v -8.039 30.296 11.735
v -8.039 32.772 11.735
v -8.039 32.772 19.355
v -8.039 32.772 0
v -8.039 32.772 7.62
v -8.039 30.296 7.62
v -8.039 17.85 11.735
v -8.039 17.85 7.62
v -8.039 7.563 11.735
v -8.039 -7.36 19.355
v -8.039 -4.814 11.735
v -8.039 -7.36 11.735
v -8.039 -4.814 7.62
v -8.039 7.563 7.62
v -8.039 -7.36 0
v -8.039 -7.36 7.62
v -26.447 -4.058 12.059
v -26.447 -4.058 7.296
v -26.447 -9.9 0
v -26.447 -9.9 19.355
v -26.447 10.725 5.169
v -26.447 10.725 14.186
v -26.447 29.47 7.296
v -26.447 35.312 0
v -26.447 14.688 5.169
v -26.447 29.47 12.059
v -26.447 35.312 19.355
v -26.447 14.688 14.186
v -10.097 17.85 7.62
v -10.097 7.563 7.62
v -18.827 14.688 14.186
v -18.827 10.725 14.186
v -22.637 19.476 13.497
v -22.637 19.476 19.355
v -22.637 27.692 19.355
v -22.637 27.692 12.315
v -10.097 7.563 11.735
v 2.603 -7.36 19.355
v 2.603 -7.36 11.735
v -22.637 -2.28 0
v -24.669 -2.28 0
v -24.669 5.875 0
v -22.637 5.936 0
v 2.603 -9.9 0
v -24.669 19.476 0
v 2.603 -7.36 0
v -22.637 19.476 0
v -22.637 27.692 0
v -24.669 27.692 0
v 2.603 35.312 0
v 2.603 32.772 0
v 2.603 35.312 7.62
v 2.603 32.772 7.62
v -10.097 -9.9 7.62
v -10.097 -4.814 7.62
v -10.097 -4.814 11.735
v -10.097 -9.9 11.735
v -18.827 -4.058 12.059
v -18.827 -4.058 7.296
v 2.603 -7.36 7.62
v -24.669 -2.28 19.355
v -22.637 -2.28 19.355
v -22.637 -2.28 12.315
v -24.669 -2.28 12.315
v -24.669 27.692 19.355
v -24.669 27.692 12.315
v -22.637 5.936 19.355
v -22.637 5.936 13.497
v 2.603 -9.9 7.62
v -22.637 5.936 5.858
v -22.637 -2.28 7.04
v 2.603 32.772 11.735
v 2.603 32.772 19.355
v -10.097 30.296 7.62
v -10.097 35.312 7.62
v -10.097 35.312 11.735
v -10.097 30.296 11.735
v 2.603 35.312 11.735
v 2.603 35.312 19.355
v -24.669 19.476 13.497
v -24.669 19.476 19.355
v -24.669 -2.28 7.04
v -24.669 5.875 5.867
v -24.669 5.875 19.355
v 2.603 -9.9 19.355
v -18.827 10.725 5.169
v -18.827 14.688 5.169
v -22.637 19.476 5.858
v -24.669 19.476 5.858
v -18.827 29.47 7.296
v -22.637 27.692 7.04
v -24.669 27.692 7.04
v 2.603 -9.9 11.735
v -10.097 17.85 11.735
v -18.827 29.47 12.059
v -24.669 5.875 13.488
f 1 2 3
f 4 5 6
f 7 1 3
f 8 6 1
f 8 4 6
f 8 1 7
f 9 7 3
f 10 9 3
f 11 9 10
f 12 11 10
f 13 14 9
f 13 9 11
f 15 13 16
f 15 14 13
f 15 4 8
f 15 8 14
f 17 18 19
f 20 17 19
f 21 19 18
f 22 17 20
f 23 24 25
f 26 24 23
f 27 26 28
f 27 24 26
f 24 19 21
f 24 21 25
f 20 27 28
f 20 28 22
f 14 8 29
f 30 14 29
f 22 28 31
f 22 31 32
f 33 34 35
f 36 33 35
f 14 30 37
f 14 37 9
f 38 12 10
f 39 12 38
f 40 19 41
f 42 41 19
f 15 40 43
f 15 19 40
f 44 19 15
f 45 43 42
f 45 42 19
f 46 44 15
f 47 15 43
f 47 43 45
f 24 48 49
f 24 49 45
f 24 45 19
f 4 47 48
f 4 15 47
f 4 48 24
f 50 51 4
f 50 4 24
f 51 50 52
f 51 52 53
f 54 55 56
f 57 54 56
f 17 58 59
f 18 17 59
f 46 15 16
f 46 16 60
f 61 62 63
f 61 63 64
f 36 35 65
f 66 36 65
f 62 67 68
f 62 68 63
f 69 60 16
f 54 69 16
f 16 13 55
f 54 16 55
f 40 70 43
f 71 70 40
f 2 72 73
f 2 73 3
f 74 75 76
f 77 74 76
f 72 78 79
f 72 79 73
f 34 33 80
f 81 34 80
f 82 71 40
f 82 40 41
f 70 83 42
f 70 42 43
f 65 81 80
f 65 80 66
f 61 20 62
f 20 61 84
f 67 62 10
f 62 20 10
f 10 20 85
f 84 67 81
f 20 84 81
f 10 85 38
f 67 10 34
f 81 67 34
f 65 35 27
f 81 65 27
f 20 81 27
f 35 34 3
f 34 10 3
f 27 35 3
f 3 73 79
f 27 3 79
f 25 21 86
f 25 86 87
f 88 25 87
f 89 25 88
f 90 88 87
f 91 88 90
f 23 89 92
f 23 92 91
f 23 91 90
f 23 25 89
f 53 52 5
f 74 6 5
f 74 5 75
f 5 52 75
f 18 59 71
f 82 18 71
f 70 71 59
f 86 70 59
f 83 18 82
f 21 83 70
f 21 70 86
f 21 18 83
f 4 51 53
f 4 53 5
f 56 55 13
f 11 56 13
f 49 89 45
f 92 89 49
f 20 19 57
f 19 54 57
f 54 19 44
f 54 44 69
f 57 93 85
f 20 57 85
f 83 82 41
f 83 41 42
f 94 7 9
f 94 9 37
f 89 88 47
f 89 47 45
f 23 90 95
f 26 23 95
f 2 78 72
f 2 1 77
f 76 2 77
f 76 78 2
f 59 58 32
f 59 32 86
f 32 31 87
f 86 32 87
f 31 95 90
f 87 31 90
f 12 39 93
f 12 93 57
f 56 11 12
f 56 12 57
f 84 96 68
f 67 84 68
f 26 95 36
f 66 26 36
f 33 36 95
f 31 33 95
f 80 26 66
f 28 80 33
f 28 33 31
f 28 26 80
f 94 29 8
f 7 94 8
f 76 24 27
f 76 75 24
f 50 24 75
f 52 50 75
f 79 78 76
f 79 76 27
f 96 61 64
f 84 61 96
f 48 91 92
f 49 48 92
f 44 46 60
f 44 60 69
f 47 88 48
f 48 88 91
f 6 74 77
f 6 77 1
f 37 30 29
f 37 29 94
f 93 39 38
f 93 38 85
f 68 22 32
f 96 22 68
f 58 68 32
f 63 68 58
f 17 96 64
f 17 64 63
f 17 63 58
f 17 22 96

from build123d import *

# Parameters (mm, degrees)
SERVO_CLASPER_2ND_HALF_SERVO_A_DEPTH     = 7.62
VESTIGIAL_START                          = 7.62
CENTER_ENCAPSULATOR_W                    = 2.0574
CENTER_ENCAPSULATOR_H                    = 12.446
CENTER_ENCAPSULATOR_H_2                  = 12.377096657
VESTIGIAL_BUT_NICE_DEPTH                 = 4.1148
SERVO_START                              = 11.7348
SERVO_CLASPER_2ND_HALF_OTHER_SERVO_DEPTH = 7.62
SKETCH12_W                               = 19.3548
SKETCH12_H                               = 45.212
SERVO_HOLDER_EXTRUDE_DEPTH               = 16.350000066
SERVO_B_CUT_DEPTH                        = 7.62
SERVO_B_SECURER_CUT_DEPTH                = 49.176817947
SERVO_B_SECURER_CUT_DEPTH_BACK           = 49.176817947
SKETCH18_W                               = 2.032
SKETCH18_H                               = 8.21582812


with BuildPart() as part:
    # Sketch1 → Servo Clasper 2nd Half (Servo A) (new body)
    with BuildSketch(Plane.XY):
        Polygon((2.60310559, 35.312310559), (2.60310559, 32.772310559), (-8.03949441, 32.772310559), (-8.03949441, -7.359689441), (2.60310559, -7.359689441), (2.60310559, -9.899689441), (-10.09689441, -9.899689441), (-10.09689441, 35.312310559), align=None)
    extrude(amount=SERVO_CLASPER_2ND_HALF_SERVO_A_DEPTH)

    # center encapsulator → Vestigial but nice (add)
    with BuildSketch(Plane.XY.offset(VESTIGIAL_START)):
        with Locations((-9.06819441, 24.072810559)):
            Rectangle(CENTER_ENCAPSULATOR_W, CENTER_ENCAPSULATOR_H)
        with Locations((-9.06819441, 1.374262231)):
            Rectangle(CENTER_ENCAPSULATOR_W, CENTER_ENCAPSULATOR_H_2)
    extrude(amount=VESTIGIAL_BUT_NICE_DEPTH)

    # Sketch7 → Servo Clasper 2nd Half (Other Servo) (add)
    with BuildSketch(Plane.XY.offset(SERVO_START)):
        Polygon((2.60310559, 35.312310559), (2.60310559, 32.772310559), (-8.03949441, 32.772310559), (-8.03949441, -7.359689441), (2.60310559, -7.359689441), (2.60310559, -9.899689441), (-10.09689441, -9.899689441), (-10.09689441, 35.312310559), align=None)
    extrude(amount=SERVO_CLASPER_2ND_HALF_OTHER_SERVO_DEPTH)

    # Sketch12 → Servo Holder Extrude (add)
    with BuildSketch(Plane.ZY.offset(10.09689441)):
        with Locations((9.6774, 12.706310559)):
            Rectangle(SKETCH12_W, SKETCH12_H)
    extrude(amount=SERVO_HOLDER_EXTRUDE_DEPTH)

    # Sketch14 → Servo B Cut (cut)
    with BuildSketch(Plane.ZY.offset(26.446894476)):
        Polygon((7.29615, 29.470310559), (12.05865, 29.470310559), (14.1859, 14.687510559), (14.1859, 10.725110559), (12.05865, -4.057689441), (7.29615, -4.057689441), (5.1689, 10.725110559), (5.1689, 14.687510559), align=None)
    extrude(amount=-SERVO_B_CUT_DEPTH, mode=Mode.SUBTRACT)

    # Sketch18 → Servo B Securer Cut (cut, two sides: drawn at the far end of the back side and taken through both)
    with BuildSketch(Plane(origin=(0, 0, 0), x_dir=(-1, 0, 0), z_dir=(0, 0, -1)).offset(-SERVO_B_SECURER_CUT_DEPTH_BACK)):
        with Locations((23.652894476, 23.584396499)):
            Rectangle(SKETCH18_W, SKETCH18_H)
        Polygon((24.668894476, 5.874578093), (22.636894476, 5.936138467), (22.636894476, -2.279689441), (24.668894476, -2.279689441), align=None)
    extrude(amount=SERVO_B_SECURER_CUT_DEPTH + SERVO_B_SECURER_CUT_DEPTH_BACK, mode=Mode.SUBTRACT)


solid = part.part
